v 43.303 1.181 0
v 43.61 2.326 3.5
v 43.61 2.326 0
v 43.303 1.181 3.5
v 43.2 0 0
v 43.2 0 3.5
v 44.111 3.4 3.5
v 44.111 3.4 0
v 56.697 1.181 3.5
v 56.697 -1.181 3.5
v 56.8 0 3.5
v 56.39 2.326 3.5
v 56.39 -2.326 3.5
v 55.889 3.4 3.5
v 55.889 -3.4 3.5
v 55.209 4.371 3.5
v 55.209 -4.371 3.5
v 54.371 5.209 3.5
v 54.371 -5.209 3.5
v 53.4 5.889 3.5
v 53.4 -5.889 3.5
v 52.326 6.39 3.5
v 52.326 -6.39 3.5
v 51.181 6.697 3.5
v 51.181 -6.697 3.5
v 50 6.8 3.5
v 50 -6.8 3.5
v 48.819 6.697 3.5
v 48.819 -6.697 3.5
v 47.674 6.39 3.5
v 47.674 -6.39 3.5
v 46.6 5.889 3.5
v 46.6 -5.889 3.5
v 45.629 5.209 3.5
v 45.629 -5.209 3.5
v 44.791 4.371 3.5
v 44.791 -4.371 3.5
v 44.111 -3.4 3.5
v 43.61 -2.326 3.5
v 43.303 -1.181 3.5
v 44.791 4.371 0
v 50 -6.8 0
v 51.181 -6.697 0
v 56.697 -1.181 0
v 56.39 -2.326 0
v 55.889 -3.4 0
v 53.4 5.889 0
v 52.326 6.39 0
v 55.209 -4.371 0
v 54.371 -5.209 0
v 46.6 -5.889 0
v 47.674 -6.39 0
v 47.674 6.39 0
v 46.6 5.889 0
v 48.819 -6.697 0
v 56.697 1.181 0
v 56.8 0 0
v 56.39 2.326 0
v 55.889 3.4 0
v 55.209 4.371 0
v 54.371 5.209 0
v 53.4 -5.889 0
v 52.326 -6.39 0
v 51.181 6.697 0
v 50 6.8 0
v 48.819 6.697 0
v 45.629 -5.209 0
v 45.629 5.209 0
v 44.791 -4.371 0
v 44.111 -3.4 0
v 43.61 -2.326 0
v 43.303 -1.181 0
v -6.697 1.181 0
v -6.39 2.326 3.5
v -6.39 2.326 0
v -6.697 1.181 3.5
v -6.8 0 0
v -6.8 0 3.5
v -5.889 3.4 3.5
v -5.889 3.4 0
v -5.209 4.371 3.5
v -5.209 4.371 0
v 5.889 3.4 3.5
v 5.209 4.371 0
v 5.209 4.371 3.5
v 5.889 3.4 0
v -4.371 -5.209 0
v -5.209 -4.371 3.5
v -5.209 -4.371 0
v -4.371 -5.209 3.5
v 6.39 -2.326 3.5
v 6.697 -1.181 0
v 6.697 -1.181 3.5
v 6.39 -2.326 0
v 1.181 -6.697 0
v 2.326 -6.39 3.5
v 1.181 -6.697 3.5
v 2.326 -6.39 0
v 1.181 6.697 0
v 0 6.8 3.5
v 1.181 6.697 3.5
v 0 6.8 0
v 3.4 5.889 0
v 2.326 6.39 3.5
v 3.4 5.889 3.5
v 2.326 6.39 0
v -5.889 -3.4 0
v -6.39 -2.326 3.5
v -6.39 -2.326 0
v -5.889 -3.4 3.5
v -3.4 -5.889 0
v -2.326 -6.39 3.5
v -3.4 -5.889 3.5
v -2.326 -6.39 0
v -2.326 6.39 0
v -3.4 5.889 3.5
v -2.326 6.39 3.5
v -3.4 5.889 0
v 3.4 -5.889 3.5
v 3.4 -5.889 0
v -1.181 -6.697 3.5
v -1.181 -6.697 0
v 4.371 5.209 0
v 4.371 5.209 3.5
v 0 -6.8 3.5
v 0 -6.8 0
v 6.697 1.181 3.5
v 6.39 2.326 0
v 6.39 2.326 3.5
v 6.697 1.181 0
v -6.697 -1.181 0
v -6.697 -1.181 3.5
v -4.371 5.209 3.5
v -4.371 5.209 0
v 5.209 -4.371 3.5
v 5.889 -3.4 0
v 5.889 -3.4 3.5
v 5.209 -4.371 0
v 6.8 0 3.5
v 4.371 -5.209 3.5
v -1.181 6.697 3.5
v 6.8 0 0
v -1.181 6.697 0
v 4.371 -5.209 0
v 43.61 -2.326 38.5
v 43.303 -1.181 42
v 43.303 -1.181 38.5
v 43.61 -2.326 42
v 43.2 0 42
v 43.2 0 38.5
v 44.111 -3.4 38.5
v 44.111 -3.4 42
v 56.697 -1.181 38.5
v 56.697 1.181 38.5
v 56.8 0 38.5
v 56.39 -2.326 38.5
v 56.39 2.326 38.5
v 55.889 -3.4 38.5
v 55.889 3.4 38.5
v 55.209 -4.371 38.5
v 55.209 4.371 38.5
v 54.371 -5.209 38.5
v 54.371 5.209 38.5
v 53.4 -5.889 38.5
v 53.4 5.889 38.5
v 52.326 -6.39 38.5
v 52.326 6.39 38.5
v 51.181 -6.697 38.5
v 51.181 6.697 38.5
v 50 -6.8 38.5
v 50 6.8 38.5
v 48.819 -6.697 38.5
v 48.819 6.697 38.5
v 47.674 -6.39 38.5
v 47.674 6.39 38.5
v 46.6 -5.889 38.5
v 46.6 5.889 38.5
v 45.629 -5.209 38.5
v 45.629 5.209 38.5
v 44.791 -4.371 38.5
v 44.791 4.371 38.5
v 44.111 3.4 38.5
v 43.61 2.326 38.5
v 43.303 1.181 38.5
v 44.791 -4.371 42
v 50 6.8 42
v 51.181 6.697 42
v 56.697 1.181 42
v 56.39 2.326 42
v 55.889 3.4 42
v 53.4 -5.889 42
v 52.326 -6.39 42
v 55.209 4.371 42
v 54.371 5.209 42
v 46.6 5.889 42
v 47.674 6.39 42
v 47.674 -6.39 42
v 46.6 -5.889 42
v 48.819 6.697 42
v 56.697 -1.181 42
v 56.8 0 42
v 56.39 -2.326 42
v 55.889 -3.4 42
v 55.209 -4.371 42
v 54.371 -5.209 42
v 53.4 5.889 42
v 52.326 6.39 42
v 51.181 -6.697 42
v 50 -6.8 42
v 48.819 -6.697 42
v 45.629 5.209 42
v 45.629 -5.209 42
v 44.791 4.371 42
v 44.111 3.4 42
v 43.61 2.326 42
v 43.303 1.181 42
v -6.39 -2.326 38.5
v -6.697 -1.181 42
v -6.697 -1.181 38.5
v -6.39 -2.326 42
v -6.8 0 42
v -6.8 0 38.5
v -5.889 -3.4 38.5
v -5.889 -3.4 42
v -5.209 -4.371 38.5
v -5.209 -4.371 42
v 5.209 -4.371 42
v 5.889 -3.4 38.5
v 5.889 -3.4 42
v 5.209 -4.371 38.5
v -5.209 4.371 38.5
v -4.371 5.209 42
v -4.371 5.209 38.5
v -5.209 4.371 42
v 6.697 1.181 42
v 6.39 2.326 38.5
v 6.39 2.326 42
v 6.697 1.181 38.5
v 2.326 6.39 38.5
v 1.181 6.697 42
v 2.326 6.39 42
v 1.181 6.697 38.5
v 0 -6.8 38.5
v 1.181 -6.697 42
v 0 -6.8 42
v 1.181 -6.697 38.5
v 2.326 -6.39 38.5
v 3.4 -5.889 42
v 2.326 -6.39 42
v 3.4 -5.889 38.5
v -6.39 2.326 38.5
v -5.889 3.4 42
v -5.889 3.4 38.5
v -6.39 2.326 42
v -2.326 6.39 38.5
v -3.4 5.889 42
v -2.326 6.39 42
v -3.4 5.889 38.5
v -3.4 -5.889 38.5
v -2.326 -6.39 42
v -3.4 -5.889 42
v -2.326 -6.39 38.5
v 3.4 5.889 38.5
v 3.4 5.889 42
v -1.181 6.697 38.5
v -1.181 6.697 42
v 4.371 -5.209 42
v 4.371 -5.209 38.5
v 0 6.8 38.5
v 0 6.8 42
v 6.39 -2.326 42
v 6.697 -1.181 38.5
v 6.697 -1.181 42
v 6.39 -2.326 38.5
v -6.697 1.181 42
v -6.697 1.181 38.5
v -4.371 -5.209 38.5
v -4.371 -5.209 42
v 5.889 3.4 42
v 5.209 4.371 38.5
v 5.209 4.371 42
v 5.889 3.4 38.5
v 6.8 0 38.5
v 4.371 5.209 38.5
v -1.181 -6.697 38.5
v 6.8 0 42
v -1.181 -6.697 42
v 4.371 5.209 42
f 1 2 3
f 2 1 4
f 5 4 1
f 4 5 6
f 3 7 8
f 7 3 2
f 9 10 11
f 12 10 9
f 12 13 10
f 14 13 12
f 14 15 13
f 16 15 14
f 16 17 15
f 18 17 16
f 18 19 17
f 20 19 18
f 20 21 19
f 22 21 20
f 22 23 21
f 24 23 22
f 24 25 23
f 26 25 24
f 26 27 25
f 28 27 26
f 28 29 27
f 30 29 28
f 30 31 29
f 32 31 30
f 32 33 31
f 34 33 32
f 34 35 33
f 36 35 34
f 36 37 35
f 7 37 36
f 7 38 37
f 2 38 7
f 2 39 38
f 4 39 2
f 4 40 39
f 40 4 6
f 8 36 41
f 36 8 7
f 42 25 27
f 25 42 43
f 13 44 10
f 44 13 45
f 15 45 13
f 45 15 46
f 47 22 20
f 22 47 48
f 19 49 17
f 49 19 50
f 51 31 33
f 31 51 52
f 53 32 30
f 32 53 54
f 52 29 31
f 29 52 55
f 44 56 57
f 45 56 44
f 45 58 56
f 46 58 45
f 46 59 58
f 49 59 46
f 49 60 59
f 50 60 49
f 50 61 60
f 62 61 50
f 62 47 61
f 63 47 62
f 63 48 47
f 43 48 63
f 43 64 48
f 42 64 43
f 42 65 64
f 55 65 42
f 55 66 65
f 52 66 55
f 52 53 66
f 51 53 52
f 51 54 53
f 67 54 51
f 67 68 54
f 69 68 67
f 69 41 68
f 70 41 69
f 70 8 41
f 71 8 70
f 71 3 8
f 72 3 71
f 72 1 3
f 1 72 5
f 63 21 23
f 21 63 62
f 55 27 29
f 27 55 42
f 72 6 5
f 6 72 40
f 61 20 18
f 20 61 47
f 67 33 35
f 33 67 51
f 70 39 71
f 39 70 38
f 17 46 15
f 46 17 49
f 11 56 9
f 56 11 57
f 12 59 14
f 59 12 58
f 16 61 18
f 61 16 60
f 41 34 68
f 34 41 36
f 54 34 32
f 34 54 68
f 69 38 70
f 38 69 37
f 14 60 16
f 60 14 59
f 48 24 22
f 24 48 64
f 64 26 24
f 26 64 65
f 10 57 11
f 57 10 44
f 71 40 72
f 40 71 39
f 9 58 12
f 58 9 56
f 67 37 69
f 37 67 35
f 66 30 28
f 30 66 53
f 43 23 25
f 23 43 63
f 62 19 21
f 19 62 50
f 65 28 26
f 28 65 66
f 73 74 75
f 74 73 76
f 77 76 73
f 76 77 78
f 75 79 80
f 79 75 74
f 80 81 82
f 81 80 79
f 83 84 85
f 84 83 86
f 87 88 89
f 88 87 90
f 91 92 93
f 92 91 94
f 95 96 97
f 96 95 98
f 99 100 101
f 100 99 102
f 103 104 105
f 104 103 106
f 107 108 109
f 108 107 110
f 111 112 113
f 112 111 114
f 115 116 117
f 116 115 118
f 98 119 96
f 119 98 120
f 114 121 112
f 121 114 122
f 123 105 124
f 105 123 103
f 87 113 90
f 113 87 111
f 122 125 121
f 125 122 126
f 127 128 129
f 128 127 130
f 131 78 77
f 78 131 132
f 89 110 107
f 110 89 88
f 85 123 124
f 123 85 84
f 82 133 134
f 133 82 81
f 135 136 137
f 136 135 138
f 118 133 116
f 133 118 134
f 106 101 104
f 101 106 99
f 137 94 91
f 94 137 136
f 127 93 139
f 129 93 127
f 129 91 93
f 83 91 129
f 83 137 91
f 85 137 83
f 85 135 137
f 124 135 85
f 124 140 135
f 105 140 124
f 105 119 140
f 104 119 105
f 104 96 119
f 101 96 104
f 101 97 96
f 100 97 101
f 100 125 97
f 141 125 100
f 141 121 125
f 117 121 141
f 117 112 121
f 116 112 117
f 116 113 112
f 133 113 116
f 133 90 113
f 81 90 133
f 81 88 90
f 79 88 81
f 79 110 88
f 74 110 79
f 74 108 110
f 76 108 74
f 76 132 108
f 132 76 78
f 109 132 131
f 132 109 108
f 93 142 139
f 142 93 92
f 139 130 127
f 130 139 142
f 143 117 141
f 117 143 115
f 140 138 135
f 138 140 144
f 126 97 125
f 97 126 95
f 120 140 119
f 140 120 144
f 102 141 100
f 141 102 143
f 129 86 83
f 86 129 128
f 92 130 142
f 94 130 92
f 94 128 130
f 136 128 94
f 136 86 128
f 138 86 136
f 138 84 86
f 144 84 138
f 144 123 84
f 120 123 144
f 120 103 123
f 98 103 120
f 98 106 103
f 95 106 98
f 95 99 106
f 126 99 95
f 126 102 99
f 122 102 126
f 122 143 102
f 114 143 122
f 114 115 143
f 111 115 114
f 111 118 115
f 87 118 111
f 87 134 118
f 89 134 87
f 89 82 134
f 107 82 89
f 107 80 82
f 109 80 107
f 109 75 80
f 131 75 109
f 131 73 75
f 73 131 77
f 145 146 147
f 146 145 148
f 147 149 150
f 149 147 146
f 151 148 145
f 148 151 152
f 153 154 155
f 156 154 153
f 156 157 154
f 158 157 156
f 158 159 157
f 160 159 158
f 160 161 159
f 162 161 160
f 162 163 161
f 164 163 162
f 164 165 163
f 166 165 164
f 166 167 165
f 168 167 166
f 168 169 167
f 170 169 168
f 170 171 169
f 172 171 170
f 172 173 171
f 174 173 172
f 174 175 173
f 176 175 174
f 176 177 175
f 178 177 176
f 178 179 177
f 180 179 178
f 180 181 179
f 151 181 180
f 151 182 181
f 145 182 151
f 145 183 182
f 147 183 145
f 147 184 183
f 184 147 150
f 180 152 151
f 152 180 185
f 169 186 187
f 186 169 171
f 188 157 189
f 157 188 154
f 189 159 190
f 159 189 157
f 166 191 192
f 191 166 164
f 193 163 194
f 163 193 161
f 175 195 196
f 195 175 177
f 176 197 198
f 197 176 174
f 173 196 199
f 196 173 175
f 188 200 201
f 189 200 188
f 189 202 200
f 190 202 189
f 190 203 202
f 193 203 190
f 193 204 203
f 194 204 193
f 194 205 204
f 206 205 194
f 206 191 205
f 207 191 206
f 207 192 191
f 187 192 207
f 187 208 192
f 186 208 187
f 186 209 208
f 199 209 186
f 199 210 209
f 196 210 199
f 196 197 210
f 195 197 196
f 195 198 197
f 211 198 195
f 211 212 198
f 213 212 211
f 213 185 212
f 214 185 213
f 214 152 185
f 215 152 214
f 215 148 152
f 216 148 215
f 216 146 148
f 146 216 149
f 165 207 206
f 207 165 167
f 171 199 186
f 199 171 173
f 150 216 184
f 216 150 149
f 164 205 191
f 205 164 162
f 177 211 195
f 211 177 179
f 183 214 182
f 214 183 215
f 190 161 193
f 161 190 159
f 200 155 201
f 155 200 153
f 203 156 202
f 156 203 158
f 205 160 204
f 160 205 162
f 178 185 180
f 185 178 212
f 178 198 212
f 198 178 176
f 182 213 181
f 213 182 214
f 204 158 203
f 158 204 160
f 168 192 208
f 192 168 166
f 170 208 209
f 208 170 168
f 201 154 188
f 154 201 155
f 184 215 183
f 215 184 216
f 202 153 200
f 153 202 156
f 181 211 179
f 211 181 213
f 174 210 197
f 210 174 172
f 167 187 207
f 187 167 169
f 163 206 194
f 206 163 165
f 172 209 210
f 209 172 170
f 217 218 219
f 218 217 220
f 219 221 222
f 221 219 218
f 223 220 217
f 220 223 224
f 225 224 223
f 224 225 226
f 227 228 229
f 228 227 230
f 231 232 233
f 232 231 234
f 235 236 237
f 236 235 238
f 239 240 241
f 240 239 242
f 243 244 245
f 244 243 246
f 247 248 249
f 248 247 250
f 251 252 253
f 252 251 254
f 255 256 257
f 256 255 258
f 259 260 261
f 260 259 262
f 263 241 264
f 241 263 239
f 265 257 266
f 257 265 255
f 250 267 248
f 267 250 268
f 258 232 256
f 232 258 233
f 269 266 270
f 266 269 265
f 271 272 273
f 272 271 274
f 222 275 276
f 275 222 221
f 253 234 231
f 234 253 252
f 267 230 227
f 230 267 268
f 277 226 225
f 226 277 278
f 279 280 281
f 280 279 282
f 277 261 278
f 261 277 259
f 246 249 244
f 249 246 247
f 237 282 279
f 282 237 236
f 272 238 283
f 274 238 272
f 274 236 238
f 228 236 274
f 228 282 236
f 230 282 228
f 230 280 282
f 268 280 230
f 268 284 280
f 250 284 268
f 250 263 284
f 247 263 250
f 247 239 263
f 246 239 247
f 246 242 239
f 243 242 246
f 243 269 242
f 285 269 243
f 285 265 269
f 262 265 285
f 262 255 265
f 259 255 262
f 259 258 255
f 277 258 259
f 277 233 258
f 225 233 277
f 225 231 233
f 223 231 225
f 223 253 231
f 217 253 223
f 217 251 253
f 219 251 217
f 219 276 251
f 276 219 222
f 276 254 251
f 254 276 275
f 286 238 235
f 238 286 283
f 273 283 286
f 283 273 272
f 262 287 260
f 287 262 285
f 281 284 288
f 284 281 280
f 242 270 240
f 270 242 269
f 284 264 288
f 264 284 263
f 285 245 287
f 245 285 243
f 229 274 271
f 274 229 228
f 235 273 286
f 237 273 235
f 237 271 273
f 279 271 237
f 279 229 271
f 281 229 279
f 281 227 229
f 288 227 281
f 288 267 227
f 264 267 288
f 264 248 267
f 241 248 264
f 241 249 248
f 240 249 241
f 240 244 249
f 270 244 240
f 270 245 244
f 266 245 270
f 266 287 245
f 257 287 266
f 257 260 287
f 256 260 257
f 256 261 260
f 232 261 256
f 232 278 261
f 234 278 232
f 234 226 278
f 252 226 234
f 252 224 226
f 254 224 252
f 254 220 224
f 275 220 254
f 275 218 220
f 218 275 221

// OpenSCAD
module link_female_left() {
	color([.5, .8, .5, 1.]) {
		difference() {
			dxf_linear_extrude(file="link.dxf", layer="0", height=6, center=false, $fn=100);
			translate([0,0,-.2]) {
				cylinder(r=6.8,h=3.5,center=false, $fn=36);
				translate([50,0,0]) {
					cylinder(r=6.8,h=3.5,center=false, $fn=36);
				}
			}
			translate([0,0,3]) {
				cylinder(r=14.2,h=3.5,center=false, $fn=36);
				translate([50,0,0]) {
					cylinder(r=14.2,h=3.5,center=false, $fn=36);
				}
			}
		}
	}
}

module link_male_left() {
	color([1, .8, .5, 1.]) {
		translate([50,0,6]){
			rotate([0,180,0]) {
				union() {
					difference() {
						dxf_linear_extrude(file="link.dxf", layer="0", height=6, center=false, $fn=100);
						translate([0,0,3]) {
							cylinder(r=14.2,h=3.5,center=false, $fn=36);
							translate([50,0,0]) {
								cylinder(r=14.2,h=3.5,center=false, $fn=36);
							}
						}
					}
					translate([0,0,2.5]) {
						cylinder(r=6.8,h=3.5,center=false, $fn=36);
						translate([50,0,0]) {
							cylinder(r=6.8,h=3.5,center=false, $fn=36);
						}
					}
				}
			}
		}
	}
}

module horizontal_part() {
	color([.8, .7, .9, 1.]) {
		difference() { // all cubes are for the chamfer
			dxf_linear_extrude(file="link.dxf", layer="horizontal", height=3, center=false, $fn=100);
			translate([10-3.2,-1.1,3.2]) {
				rotate([0,45,0]) {
					cube(size = [10,7,6], center = false);
				}
				translate([0,37.4,0]) {
					rotate([0,45,0]) {
						cube(size = [10,7,6], center = false);
					}
				}
			}
			translate([-10-3.2,-1.1,-3.2]) {
				rotate([0,-45,0]) {
					cube(size = [10,7,6], center = false);
				}
				translate([0,37.4,0]) {
					rotate([0,-45,0]) {
						cube(size = [10,7,6], center = false);
					}
				}
			}
		}
	}
}

module top_part() {
	translate([25,-14,0]) {
		rotate([90, 0, 0]) {
			horizontal_part();
		}
	}
}

module bottom_part() {
	translate([25,14,42]) {
		rotate([-90, 0, 0]) {
			horizontal_part();
		}
	}
}

translate([-50,0,0]) {
	link_female();
}

rotate([0,0,30*sin($t*180)]) {
	link_male();
}

module link_male() {
	link_male_left();
	translate([0,0,42]) {
		rotate([180, 0, 0]) {
			link_male_left();
		}
	}
	top_part();
	bottom_part();
}
module link_female() {
	link_female_left();
	translate([0,0,42]) {
		rotate([180, 0, 0]) {
			link_female_left();
		}
	}
	top_part();
	bottom_part();
}



/*
translate([50,0,0]) {
	rotate([0,0,29.5]) {
		link_female();
		translate([50,0,0]) {
			rotate([0,0,29.5]) {
				link_male();
				translate([50,0,0]) {
					rotate([0,0,29.5]) {
						link_female();
						translate([50,0,0]) {
							rotate([0,0,29.5]) {
								link_male();
								translate([50,0,0]) {
									rotate([0,0,29.5]) {
										link_female();
										translate([50,0,0]) {
											rotate([0,0,29.5]) {
												link_male();
												translate([50,0,0]) {
													link_female();
												}
											}
										}
									}
								}
							}
						}
					}
				}
			}
		}
	}
}

*/
